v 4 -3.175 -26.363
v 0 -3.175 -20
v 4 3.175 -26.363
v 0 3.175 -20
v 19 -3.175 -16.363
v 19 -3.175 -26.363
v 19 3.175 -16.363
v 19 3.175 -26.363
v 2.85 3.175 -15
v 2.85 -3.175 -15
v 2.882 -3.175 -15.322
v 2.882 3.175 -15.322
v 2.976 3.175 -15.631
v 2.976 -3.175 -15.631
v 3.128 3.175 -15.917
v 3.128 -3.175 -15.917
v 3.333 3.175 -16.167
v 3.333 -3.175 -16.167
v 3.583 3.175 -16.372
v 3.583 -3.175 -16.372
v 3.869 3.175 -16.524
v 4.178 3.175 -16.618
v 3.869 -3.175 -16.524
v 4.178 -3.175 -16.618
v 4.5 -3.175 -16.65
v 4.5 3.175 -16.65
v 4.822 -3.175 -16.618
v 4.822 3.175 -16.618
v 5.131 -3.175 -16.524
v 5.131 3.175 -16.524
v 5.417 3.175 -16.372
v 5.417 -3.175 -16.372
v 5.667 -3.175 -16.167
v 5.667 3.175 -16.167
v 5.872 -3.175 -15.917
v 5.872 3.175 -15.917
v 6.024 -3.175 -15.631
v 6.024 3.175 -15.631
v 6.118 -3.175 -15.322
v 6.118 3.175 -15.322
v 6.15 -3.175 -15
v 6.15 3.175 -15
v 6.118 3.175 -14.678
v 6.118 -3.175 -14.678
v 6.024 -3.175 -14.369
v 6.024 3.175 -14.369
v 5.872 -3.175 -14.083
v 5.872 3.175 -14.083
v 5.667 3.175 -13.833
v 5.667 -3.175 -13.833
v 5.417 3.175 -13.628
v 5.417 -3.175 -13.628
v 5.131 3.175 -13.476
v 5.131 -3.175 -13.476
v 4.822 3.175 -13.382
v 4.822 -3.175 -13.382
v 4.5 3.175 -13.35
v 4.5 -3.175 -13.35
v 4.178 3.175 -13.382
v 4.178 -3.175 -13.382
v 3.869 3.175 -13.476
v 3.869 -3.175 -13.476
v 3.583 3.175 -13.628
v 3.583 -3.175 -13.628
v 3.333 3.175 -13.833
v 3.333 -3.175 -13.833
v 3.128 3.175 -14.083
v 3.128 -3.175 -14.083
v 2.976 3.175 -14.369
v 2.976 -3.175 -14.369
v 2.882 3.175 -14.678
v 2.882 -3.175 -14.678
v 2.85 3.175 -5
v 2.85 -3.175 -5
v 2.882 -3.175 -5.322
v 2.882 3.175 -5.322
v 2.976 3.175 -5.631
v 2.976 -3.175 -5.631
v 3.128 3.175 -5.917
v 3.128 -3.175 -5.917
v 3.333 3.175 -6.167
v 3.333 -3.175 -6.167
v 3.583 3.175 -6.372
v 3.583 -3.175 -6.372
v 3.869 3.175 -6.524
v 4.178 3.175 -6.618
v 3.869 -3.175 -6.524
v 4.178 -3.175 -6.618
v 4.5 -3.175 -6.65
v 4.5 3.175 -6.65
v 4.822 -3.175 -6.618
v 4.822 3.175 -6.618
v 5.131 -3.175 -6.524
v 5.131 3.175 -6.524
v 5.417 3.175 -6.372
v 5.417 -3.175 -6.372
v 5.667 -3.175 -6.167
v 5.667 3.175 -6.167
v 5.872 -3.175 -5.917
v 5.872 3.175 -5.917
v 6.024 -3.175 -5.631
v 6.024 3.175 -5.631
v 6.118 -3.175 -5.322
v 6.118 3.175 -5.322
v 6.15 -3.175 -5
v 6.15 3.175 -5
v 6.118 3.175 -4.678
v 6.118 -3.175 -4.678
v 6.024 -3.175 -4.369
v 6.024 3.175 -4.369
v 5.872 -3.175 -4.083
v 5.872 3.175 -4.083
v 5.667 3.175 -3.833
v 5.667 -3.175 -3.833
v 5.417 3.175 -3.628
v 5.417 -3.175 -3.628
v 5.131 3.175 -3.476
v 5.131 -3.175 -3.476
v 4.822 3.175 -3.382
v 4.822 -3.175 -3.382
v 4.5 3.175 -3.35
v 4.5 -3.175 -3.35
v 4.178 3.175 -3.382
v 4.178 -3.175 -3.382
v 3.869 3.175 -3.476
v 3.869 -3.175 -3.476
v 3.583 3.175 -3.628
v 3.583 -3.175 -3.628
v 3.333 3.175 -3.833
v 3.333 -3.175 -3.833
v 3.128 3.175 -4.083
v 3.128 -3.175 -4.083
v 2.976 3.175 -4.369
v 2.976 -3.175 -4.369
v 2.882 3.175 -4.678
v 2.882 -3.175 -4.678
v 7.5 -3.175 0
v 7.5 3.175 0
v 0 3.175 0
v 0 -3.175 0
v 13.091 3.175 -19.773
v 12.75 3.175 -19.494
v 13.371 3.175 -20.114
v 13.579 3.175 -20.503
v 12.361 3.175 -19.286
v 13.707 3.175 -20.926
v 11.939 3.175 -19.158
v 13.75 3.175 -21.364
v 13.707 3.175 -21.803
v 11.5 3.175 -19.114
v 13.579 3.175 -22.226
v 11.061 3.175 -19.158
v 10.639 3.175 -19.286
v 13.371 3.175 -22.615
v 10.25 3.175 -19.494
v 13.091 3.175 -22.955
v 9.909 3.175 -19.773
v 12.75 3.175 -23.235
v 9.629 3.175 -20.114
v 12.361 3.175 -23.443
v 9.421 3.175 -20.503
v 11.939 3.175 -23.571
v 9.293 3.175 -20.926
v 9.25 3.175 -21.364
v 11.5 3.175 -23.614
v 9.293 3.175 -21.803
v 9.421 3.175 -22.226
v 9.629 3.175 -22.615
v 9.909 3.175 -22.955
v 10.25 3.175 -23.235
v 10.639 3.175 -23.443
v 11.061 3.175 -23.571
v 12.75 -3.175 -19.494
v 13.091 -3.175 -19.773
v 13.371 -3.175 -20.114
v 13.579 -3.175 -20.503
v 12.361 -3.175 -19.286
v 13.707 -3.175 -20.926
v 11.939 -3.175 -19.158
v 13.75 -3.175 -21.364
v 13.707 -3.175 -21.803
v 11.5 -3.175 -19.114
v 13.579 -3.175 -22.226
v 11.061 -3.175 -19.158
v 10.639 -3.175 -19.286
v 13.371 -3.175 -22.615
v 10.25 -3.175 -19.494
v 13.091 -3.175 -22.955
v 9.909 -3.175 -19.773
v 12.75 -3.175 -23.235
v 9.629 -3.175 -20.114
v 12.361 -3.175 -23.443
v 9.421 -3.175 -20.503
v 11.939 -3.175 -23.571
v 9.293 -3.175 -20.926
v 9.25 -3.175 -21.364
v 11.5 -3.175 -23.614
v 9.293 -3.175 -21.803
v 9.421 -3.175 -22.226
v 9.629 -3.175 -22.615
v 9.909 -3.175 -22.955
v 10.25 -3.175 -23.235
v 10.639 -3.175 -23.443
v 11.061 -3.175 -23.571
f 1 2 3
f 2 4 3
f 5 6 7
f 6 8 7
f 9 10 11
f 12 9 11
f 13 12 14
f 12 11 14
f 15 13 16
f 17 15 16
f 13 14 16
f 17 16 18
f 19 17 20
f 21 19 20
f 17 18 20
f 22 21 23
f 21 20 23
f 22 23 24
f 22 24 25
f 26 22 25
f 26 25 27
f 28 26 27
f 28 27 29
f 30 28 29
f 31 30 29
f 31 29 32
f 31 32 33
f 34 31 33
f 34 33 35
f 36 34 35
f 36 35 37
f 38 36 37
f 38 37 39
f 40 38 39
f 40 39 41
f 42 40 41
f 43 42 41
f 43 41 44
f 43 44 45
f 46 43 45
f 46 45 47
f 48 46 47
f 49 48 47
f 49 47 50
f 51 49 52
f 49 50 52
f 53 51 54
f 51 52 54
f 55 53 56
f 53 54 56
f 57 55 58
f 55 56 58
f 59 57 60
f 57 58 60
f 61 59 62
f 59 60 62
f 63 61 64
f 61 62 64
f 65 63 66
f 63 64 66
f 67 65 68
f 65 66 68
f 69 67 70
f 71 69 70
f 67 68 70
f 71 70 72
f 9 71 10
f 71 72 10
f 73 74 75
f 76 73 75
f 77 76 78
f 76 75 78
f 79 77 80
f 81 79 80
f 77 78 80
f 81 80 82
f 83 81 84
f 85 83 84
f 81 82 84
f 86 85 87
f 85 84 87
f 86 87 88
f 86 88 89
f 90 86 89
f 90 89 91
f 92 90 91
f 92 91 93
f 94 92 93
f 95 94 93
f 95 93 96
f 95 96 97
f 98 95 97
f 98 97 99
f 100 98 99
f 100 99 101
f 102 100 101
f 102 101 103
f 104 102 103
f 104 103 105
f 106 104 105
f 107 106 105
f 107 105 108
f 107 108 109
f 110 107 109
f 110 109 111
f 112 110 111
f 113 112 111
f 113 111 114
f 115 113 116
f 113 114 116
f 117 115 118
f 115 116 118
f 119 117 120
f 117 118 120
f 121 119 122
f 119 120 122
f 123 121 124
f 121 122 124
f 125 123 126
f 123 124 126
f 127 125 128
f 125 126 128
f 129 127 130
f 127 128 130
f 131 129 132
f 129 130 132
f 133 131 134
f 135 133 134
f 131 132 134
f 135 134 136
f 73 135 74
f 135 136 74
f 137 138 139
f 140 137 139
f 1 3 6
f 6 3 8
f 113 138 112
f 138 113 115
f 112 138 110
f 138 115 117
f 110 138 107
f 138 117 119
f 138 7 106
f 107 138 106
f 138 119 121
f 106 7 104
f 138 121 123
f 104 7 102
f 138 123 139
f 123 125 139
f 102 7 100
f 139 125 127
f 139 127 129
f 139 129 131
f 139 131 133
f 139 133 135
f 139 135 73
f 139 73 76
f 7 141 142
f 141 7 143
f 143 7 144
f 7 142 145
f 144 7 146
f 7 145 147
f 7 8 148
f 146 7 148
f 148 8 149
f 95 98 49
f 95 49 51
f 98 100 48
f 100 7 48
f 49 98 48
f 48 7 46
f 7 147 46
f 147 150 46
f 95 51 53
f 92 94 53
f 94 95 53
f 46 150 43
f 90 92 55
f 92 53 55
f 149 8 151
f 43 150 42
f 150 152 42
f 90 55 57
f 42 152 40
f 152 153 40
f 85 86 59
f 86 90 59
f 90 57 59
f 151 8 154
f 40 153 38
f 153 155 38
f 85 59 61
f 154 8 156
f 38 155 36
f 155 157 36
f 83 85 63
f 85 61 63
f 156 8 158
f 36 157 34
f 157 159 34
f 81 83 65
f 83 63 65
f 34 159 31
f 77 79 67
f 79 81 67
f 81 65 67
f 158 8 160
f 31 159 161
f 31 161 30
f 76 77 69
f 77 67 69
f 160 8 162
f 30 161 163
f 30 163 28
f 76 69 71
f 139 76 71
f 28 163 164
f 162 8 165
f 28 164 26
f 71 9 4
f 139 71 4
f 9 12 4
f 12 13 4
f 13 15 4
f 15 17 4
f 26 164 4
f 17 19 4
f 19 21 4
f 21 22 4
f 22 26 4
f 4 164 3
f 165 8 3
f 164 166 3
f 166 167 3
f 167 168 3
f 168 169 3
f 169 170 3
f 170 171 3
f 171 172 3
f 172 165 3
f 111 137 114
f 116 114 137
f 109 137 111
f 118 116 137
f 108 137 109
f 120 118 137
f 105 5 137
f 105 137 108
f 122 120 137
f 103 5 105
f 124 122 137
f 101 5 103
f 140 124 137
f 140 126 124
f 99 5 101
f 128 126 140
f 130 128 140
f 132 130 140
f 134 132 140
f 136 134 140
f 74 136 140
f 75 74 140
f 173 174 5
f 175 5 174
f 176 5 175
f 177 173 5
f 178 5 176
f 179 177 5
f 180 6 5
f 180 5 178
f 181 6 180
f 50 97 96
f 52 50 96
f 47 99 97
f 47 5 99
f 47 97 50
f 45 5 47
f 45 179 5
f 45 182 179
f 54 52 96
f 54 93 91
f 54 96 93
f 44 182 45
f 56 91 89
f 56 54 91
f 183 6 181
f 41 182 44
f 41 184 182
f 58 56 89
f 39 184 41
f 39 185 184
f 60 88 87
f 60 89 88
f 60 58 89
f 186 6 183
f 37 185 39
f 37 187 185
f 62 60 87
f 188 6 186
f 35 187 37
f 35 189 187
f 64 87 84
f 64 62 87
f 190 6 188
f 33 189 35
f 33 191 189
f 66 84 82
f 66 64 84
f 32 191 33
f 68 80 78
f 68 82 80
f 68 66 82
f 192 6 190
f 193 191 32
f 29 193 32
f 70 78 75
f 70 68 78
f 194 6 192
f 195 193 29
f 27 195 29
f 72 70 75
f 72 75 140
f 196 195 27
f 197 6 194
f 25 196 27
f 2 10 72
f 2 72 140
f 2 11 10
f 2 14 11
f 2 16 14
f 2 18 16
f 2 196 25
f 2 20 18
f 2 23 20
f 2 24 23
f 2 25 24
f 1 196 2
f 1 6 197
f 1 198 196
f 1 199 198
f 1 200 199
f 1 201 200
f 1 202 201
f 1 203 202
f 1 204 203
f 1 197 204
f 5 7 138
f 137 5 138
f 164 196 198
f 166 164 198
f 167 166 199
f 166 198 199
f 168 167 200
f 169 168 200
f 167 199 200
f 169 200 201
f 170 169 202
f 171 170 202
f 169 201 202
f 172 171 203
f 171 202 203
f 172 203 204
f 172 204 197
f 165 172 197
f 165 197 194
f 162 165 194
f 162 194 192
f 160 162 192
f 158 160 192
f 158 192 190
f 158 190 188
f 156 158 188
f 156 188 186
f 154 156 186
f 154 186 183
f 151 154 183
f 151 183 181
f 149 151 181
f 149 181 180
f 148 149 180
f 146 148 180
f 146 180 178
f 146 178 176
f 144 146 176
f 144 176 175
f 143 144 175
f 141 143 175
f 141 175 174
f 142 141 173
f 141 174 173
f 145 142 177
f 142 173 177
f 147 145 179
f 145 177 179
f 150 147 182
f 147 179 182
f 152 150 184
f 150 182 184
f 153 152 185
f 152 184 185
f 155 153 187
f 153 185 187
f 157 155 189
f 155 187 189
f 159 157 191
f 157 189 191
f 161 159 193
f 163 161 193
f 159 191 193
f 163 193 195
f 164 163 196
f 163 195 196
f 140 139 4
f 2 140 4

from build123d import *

# Parameters (mm, degrees)
BOSS_EXTRUDE1_DEPTH   = 3.175
M4X0_7_TAPPED_HOLE1_D = 3.3
M4_CLEARANCE_HOLE1_D  = 4.5


with BuildPart() as part:
    # Sketch1 → Boss-Extrude1 (new body, symmetric)
    with BuildSketch(Plane(origin=(0, 0, 0), x_dir=(1, 0, 0), z_dir=(0, 1, 0))):
        Polygon((0, 0), (0, 20), (4, 26.363068172), (19, 26.363068172), (19, 16.363068172), (7.5, 0), align=None)
    extrude(amount=BOSS_EXTRUDE1_DEPTH, both=True)

    # M4x0.7 Tapped Hole1 (through all)
    with Locations(Plane(origin=(0, 3.175, 0), x_dir=(1, 0, 0), z_dir=(0, 1, 0))):
        with Locations((4.499999553, 15), (4.499999553, 5)):
            Hole(M4X0_7_TAPPED_HOLE1_D / 2)

    # M4 Clearance Hole1 (through all)
    with Locations(Plane(origin=(0, 3.175, 0), x_dir=(1, 0, 0), z_dir=(0, 1, 0))):
        with Locations((11.5, 21.364471274)):
            Hole(M4_CLEARANCE_HOLE1_D / 2)


solid = part.part
